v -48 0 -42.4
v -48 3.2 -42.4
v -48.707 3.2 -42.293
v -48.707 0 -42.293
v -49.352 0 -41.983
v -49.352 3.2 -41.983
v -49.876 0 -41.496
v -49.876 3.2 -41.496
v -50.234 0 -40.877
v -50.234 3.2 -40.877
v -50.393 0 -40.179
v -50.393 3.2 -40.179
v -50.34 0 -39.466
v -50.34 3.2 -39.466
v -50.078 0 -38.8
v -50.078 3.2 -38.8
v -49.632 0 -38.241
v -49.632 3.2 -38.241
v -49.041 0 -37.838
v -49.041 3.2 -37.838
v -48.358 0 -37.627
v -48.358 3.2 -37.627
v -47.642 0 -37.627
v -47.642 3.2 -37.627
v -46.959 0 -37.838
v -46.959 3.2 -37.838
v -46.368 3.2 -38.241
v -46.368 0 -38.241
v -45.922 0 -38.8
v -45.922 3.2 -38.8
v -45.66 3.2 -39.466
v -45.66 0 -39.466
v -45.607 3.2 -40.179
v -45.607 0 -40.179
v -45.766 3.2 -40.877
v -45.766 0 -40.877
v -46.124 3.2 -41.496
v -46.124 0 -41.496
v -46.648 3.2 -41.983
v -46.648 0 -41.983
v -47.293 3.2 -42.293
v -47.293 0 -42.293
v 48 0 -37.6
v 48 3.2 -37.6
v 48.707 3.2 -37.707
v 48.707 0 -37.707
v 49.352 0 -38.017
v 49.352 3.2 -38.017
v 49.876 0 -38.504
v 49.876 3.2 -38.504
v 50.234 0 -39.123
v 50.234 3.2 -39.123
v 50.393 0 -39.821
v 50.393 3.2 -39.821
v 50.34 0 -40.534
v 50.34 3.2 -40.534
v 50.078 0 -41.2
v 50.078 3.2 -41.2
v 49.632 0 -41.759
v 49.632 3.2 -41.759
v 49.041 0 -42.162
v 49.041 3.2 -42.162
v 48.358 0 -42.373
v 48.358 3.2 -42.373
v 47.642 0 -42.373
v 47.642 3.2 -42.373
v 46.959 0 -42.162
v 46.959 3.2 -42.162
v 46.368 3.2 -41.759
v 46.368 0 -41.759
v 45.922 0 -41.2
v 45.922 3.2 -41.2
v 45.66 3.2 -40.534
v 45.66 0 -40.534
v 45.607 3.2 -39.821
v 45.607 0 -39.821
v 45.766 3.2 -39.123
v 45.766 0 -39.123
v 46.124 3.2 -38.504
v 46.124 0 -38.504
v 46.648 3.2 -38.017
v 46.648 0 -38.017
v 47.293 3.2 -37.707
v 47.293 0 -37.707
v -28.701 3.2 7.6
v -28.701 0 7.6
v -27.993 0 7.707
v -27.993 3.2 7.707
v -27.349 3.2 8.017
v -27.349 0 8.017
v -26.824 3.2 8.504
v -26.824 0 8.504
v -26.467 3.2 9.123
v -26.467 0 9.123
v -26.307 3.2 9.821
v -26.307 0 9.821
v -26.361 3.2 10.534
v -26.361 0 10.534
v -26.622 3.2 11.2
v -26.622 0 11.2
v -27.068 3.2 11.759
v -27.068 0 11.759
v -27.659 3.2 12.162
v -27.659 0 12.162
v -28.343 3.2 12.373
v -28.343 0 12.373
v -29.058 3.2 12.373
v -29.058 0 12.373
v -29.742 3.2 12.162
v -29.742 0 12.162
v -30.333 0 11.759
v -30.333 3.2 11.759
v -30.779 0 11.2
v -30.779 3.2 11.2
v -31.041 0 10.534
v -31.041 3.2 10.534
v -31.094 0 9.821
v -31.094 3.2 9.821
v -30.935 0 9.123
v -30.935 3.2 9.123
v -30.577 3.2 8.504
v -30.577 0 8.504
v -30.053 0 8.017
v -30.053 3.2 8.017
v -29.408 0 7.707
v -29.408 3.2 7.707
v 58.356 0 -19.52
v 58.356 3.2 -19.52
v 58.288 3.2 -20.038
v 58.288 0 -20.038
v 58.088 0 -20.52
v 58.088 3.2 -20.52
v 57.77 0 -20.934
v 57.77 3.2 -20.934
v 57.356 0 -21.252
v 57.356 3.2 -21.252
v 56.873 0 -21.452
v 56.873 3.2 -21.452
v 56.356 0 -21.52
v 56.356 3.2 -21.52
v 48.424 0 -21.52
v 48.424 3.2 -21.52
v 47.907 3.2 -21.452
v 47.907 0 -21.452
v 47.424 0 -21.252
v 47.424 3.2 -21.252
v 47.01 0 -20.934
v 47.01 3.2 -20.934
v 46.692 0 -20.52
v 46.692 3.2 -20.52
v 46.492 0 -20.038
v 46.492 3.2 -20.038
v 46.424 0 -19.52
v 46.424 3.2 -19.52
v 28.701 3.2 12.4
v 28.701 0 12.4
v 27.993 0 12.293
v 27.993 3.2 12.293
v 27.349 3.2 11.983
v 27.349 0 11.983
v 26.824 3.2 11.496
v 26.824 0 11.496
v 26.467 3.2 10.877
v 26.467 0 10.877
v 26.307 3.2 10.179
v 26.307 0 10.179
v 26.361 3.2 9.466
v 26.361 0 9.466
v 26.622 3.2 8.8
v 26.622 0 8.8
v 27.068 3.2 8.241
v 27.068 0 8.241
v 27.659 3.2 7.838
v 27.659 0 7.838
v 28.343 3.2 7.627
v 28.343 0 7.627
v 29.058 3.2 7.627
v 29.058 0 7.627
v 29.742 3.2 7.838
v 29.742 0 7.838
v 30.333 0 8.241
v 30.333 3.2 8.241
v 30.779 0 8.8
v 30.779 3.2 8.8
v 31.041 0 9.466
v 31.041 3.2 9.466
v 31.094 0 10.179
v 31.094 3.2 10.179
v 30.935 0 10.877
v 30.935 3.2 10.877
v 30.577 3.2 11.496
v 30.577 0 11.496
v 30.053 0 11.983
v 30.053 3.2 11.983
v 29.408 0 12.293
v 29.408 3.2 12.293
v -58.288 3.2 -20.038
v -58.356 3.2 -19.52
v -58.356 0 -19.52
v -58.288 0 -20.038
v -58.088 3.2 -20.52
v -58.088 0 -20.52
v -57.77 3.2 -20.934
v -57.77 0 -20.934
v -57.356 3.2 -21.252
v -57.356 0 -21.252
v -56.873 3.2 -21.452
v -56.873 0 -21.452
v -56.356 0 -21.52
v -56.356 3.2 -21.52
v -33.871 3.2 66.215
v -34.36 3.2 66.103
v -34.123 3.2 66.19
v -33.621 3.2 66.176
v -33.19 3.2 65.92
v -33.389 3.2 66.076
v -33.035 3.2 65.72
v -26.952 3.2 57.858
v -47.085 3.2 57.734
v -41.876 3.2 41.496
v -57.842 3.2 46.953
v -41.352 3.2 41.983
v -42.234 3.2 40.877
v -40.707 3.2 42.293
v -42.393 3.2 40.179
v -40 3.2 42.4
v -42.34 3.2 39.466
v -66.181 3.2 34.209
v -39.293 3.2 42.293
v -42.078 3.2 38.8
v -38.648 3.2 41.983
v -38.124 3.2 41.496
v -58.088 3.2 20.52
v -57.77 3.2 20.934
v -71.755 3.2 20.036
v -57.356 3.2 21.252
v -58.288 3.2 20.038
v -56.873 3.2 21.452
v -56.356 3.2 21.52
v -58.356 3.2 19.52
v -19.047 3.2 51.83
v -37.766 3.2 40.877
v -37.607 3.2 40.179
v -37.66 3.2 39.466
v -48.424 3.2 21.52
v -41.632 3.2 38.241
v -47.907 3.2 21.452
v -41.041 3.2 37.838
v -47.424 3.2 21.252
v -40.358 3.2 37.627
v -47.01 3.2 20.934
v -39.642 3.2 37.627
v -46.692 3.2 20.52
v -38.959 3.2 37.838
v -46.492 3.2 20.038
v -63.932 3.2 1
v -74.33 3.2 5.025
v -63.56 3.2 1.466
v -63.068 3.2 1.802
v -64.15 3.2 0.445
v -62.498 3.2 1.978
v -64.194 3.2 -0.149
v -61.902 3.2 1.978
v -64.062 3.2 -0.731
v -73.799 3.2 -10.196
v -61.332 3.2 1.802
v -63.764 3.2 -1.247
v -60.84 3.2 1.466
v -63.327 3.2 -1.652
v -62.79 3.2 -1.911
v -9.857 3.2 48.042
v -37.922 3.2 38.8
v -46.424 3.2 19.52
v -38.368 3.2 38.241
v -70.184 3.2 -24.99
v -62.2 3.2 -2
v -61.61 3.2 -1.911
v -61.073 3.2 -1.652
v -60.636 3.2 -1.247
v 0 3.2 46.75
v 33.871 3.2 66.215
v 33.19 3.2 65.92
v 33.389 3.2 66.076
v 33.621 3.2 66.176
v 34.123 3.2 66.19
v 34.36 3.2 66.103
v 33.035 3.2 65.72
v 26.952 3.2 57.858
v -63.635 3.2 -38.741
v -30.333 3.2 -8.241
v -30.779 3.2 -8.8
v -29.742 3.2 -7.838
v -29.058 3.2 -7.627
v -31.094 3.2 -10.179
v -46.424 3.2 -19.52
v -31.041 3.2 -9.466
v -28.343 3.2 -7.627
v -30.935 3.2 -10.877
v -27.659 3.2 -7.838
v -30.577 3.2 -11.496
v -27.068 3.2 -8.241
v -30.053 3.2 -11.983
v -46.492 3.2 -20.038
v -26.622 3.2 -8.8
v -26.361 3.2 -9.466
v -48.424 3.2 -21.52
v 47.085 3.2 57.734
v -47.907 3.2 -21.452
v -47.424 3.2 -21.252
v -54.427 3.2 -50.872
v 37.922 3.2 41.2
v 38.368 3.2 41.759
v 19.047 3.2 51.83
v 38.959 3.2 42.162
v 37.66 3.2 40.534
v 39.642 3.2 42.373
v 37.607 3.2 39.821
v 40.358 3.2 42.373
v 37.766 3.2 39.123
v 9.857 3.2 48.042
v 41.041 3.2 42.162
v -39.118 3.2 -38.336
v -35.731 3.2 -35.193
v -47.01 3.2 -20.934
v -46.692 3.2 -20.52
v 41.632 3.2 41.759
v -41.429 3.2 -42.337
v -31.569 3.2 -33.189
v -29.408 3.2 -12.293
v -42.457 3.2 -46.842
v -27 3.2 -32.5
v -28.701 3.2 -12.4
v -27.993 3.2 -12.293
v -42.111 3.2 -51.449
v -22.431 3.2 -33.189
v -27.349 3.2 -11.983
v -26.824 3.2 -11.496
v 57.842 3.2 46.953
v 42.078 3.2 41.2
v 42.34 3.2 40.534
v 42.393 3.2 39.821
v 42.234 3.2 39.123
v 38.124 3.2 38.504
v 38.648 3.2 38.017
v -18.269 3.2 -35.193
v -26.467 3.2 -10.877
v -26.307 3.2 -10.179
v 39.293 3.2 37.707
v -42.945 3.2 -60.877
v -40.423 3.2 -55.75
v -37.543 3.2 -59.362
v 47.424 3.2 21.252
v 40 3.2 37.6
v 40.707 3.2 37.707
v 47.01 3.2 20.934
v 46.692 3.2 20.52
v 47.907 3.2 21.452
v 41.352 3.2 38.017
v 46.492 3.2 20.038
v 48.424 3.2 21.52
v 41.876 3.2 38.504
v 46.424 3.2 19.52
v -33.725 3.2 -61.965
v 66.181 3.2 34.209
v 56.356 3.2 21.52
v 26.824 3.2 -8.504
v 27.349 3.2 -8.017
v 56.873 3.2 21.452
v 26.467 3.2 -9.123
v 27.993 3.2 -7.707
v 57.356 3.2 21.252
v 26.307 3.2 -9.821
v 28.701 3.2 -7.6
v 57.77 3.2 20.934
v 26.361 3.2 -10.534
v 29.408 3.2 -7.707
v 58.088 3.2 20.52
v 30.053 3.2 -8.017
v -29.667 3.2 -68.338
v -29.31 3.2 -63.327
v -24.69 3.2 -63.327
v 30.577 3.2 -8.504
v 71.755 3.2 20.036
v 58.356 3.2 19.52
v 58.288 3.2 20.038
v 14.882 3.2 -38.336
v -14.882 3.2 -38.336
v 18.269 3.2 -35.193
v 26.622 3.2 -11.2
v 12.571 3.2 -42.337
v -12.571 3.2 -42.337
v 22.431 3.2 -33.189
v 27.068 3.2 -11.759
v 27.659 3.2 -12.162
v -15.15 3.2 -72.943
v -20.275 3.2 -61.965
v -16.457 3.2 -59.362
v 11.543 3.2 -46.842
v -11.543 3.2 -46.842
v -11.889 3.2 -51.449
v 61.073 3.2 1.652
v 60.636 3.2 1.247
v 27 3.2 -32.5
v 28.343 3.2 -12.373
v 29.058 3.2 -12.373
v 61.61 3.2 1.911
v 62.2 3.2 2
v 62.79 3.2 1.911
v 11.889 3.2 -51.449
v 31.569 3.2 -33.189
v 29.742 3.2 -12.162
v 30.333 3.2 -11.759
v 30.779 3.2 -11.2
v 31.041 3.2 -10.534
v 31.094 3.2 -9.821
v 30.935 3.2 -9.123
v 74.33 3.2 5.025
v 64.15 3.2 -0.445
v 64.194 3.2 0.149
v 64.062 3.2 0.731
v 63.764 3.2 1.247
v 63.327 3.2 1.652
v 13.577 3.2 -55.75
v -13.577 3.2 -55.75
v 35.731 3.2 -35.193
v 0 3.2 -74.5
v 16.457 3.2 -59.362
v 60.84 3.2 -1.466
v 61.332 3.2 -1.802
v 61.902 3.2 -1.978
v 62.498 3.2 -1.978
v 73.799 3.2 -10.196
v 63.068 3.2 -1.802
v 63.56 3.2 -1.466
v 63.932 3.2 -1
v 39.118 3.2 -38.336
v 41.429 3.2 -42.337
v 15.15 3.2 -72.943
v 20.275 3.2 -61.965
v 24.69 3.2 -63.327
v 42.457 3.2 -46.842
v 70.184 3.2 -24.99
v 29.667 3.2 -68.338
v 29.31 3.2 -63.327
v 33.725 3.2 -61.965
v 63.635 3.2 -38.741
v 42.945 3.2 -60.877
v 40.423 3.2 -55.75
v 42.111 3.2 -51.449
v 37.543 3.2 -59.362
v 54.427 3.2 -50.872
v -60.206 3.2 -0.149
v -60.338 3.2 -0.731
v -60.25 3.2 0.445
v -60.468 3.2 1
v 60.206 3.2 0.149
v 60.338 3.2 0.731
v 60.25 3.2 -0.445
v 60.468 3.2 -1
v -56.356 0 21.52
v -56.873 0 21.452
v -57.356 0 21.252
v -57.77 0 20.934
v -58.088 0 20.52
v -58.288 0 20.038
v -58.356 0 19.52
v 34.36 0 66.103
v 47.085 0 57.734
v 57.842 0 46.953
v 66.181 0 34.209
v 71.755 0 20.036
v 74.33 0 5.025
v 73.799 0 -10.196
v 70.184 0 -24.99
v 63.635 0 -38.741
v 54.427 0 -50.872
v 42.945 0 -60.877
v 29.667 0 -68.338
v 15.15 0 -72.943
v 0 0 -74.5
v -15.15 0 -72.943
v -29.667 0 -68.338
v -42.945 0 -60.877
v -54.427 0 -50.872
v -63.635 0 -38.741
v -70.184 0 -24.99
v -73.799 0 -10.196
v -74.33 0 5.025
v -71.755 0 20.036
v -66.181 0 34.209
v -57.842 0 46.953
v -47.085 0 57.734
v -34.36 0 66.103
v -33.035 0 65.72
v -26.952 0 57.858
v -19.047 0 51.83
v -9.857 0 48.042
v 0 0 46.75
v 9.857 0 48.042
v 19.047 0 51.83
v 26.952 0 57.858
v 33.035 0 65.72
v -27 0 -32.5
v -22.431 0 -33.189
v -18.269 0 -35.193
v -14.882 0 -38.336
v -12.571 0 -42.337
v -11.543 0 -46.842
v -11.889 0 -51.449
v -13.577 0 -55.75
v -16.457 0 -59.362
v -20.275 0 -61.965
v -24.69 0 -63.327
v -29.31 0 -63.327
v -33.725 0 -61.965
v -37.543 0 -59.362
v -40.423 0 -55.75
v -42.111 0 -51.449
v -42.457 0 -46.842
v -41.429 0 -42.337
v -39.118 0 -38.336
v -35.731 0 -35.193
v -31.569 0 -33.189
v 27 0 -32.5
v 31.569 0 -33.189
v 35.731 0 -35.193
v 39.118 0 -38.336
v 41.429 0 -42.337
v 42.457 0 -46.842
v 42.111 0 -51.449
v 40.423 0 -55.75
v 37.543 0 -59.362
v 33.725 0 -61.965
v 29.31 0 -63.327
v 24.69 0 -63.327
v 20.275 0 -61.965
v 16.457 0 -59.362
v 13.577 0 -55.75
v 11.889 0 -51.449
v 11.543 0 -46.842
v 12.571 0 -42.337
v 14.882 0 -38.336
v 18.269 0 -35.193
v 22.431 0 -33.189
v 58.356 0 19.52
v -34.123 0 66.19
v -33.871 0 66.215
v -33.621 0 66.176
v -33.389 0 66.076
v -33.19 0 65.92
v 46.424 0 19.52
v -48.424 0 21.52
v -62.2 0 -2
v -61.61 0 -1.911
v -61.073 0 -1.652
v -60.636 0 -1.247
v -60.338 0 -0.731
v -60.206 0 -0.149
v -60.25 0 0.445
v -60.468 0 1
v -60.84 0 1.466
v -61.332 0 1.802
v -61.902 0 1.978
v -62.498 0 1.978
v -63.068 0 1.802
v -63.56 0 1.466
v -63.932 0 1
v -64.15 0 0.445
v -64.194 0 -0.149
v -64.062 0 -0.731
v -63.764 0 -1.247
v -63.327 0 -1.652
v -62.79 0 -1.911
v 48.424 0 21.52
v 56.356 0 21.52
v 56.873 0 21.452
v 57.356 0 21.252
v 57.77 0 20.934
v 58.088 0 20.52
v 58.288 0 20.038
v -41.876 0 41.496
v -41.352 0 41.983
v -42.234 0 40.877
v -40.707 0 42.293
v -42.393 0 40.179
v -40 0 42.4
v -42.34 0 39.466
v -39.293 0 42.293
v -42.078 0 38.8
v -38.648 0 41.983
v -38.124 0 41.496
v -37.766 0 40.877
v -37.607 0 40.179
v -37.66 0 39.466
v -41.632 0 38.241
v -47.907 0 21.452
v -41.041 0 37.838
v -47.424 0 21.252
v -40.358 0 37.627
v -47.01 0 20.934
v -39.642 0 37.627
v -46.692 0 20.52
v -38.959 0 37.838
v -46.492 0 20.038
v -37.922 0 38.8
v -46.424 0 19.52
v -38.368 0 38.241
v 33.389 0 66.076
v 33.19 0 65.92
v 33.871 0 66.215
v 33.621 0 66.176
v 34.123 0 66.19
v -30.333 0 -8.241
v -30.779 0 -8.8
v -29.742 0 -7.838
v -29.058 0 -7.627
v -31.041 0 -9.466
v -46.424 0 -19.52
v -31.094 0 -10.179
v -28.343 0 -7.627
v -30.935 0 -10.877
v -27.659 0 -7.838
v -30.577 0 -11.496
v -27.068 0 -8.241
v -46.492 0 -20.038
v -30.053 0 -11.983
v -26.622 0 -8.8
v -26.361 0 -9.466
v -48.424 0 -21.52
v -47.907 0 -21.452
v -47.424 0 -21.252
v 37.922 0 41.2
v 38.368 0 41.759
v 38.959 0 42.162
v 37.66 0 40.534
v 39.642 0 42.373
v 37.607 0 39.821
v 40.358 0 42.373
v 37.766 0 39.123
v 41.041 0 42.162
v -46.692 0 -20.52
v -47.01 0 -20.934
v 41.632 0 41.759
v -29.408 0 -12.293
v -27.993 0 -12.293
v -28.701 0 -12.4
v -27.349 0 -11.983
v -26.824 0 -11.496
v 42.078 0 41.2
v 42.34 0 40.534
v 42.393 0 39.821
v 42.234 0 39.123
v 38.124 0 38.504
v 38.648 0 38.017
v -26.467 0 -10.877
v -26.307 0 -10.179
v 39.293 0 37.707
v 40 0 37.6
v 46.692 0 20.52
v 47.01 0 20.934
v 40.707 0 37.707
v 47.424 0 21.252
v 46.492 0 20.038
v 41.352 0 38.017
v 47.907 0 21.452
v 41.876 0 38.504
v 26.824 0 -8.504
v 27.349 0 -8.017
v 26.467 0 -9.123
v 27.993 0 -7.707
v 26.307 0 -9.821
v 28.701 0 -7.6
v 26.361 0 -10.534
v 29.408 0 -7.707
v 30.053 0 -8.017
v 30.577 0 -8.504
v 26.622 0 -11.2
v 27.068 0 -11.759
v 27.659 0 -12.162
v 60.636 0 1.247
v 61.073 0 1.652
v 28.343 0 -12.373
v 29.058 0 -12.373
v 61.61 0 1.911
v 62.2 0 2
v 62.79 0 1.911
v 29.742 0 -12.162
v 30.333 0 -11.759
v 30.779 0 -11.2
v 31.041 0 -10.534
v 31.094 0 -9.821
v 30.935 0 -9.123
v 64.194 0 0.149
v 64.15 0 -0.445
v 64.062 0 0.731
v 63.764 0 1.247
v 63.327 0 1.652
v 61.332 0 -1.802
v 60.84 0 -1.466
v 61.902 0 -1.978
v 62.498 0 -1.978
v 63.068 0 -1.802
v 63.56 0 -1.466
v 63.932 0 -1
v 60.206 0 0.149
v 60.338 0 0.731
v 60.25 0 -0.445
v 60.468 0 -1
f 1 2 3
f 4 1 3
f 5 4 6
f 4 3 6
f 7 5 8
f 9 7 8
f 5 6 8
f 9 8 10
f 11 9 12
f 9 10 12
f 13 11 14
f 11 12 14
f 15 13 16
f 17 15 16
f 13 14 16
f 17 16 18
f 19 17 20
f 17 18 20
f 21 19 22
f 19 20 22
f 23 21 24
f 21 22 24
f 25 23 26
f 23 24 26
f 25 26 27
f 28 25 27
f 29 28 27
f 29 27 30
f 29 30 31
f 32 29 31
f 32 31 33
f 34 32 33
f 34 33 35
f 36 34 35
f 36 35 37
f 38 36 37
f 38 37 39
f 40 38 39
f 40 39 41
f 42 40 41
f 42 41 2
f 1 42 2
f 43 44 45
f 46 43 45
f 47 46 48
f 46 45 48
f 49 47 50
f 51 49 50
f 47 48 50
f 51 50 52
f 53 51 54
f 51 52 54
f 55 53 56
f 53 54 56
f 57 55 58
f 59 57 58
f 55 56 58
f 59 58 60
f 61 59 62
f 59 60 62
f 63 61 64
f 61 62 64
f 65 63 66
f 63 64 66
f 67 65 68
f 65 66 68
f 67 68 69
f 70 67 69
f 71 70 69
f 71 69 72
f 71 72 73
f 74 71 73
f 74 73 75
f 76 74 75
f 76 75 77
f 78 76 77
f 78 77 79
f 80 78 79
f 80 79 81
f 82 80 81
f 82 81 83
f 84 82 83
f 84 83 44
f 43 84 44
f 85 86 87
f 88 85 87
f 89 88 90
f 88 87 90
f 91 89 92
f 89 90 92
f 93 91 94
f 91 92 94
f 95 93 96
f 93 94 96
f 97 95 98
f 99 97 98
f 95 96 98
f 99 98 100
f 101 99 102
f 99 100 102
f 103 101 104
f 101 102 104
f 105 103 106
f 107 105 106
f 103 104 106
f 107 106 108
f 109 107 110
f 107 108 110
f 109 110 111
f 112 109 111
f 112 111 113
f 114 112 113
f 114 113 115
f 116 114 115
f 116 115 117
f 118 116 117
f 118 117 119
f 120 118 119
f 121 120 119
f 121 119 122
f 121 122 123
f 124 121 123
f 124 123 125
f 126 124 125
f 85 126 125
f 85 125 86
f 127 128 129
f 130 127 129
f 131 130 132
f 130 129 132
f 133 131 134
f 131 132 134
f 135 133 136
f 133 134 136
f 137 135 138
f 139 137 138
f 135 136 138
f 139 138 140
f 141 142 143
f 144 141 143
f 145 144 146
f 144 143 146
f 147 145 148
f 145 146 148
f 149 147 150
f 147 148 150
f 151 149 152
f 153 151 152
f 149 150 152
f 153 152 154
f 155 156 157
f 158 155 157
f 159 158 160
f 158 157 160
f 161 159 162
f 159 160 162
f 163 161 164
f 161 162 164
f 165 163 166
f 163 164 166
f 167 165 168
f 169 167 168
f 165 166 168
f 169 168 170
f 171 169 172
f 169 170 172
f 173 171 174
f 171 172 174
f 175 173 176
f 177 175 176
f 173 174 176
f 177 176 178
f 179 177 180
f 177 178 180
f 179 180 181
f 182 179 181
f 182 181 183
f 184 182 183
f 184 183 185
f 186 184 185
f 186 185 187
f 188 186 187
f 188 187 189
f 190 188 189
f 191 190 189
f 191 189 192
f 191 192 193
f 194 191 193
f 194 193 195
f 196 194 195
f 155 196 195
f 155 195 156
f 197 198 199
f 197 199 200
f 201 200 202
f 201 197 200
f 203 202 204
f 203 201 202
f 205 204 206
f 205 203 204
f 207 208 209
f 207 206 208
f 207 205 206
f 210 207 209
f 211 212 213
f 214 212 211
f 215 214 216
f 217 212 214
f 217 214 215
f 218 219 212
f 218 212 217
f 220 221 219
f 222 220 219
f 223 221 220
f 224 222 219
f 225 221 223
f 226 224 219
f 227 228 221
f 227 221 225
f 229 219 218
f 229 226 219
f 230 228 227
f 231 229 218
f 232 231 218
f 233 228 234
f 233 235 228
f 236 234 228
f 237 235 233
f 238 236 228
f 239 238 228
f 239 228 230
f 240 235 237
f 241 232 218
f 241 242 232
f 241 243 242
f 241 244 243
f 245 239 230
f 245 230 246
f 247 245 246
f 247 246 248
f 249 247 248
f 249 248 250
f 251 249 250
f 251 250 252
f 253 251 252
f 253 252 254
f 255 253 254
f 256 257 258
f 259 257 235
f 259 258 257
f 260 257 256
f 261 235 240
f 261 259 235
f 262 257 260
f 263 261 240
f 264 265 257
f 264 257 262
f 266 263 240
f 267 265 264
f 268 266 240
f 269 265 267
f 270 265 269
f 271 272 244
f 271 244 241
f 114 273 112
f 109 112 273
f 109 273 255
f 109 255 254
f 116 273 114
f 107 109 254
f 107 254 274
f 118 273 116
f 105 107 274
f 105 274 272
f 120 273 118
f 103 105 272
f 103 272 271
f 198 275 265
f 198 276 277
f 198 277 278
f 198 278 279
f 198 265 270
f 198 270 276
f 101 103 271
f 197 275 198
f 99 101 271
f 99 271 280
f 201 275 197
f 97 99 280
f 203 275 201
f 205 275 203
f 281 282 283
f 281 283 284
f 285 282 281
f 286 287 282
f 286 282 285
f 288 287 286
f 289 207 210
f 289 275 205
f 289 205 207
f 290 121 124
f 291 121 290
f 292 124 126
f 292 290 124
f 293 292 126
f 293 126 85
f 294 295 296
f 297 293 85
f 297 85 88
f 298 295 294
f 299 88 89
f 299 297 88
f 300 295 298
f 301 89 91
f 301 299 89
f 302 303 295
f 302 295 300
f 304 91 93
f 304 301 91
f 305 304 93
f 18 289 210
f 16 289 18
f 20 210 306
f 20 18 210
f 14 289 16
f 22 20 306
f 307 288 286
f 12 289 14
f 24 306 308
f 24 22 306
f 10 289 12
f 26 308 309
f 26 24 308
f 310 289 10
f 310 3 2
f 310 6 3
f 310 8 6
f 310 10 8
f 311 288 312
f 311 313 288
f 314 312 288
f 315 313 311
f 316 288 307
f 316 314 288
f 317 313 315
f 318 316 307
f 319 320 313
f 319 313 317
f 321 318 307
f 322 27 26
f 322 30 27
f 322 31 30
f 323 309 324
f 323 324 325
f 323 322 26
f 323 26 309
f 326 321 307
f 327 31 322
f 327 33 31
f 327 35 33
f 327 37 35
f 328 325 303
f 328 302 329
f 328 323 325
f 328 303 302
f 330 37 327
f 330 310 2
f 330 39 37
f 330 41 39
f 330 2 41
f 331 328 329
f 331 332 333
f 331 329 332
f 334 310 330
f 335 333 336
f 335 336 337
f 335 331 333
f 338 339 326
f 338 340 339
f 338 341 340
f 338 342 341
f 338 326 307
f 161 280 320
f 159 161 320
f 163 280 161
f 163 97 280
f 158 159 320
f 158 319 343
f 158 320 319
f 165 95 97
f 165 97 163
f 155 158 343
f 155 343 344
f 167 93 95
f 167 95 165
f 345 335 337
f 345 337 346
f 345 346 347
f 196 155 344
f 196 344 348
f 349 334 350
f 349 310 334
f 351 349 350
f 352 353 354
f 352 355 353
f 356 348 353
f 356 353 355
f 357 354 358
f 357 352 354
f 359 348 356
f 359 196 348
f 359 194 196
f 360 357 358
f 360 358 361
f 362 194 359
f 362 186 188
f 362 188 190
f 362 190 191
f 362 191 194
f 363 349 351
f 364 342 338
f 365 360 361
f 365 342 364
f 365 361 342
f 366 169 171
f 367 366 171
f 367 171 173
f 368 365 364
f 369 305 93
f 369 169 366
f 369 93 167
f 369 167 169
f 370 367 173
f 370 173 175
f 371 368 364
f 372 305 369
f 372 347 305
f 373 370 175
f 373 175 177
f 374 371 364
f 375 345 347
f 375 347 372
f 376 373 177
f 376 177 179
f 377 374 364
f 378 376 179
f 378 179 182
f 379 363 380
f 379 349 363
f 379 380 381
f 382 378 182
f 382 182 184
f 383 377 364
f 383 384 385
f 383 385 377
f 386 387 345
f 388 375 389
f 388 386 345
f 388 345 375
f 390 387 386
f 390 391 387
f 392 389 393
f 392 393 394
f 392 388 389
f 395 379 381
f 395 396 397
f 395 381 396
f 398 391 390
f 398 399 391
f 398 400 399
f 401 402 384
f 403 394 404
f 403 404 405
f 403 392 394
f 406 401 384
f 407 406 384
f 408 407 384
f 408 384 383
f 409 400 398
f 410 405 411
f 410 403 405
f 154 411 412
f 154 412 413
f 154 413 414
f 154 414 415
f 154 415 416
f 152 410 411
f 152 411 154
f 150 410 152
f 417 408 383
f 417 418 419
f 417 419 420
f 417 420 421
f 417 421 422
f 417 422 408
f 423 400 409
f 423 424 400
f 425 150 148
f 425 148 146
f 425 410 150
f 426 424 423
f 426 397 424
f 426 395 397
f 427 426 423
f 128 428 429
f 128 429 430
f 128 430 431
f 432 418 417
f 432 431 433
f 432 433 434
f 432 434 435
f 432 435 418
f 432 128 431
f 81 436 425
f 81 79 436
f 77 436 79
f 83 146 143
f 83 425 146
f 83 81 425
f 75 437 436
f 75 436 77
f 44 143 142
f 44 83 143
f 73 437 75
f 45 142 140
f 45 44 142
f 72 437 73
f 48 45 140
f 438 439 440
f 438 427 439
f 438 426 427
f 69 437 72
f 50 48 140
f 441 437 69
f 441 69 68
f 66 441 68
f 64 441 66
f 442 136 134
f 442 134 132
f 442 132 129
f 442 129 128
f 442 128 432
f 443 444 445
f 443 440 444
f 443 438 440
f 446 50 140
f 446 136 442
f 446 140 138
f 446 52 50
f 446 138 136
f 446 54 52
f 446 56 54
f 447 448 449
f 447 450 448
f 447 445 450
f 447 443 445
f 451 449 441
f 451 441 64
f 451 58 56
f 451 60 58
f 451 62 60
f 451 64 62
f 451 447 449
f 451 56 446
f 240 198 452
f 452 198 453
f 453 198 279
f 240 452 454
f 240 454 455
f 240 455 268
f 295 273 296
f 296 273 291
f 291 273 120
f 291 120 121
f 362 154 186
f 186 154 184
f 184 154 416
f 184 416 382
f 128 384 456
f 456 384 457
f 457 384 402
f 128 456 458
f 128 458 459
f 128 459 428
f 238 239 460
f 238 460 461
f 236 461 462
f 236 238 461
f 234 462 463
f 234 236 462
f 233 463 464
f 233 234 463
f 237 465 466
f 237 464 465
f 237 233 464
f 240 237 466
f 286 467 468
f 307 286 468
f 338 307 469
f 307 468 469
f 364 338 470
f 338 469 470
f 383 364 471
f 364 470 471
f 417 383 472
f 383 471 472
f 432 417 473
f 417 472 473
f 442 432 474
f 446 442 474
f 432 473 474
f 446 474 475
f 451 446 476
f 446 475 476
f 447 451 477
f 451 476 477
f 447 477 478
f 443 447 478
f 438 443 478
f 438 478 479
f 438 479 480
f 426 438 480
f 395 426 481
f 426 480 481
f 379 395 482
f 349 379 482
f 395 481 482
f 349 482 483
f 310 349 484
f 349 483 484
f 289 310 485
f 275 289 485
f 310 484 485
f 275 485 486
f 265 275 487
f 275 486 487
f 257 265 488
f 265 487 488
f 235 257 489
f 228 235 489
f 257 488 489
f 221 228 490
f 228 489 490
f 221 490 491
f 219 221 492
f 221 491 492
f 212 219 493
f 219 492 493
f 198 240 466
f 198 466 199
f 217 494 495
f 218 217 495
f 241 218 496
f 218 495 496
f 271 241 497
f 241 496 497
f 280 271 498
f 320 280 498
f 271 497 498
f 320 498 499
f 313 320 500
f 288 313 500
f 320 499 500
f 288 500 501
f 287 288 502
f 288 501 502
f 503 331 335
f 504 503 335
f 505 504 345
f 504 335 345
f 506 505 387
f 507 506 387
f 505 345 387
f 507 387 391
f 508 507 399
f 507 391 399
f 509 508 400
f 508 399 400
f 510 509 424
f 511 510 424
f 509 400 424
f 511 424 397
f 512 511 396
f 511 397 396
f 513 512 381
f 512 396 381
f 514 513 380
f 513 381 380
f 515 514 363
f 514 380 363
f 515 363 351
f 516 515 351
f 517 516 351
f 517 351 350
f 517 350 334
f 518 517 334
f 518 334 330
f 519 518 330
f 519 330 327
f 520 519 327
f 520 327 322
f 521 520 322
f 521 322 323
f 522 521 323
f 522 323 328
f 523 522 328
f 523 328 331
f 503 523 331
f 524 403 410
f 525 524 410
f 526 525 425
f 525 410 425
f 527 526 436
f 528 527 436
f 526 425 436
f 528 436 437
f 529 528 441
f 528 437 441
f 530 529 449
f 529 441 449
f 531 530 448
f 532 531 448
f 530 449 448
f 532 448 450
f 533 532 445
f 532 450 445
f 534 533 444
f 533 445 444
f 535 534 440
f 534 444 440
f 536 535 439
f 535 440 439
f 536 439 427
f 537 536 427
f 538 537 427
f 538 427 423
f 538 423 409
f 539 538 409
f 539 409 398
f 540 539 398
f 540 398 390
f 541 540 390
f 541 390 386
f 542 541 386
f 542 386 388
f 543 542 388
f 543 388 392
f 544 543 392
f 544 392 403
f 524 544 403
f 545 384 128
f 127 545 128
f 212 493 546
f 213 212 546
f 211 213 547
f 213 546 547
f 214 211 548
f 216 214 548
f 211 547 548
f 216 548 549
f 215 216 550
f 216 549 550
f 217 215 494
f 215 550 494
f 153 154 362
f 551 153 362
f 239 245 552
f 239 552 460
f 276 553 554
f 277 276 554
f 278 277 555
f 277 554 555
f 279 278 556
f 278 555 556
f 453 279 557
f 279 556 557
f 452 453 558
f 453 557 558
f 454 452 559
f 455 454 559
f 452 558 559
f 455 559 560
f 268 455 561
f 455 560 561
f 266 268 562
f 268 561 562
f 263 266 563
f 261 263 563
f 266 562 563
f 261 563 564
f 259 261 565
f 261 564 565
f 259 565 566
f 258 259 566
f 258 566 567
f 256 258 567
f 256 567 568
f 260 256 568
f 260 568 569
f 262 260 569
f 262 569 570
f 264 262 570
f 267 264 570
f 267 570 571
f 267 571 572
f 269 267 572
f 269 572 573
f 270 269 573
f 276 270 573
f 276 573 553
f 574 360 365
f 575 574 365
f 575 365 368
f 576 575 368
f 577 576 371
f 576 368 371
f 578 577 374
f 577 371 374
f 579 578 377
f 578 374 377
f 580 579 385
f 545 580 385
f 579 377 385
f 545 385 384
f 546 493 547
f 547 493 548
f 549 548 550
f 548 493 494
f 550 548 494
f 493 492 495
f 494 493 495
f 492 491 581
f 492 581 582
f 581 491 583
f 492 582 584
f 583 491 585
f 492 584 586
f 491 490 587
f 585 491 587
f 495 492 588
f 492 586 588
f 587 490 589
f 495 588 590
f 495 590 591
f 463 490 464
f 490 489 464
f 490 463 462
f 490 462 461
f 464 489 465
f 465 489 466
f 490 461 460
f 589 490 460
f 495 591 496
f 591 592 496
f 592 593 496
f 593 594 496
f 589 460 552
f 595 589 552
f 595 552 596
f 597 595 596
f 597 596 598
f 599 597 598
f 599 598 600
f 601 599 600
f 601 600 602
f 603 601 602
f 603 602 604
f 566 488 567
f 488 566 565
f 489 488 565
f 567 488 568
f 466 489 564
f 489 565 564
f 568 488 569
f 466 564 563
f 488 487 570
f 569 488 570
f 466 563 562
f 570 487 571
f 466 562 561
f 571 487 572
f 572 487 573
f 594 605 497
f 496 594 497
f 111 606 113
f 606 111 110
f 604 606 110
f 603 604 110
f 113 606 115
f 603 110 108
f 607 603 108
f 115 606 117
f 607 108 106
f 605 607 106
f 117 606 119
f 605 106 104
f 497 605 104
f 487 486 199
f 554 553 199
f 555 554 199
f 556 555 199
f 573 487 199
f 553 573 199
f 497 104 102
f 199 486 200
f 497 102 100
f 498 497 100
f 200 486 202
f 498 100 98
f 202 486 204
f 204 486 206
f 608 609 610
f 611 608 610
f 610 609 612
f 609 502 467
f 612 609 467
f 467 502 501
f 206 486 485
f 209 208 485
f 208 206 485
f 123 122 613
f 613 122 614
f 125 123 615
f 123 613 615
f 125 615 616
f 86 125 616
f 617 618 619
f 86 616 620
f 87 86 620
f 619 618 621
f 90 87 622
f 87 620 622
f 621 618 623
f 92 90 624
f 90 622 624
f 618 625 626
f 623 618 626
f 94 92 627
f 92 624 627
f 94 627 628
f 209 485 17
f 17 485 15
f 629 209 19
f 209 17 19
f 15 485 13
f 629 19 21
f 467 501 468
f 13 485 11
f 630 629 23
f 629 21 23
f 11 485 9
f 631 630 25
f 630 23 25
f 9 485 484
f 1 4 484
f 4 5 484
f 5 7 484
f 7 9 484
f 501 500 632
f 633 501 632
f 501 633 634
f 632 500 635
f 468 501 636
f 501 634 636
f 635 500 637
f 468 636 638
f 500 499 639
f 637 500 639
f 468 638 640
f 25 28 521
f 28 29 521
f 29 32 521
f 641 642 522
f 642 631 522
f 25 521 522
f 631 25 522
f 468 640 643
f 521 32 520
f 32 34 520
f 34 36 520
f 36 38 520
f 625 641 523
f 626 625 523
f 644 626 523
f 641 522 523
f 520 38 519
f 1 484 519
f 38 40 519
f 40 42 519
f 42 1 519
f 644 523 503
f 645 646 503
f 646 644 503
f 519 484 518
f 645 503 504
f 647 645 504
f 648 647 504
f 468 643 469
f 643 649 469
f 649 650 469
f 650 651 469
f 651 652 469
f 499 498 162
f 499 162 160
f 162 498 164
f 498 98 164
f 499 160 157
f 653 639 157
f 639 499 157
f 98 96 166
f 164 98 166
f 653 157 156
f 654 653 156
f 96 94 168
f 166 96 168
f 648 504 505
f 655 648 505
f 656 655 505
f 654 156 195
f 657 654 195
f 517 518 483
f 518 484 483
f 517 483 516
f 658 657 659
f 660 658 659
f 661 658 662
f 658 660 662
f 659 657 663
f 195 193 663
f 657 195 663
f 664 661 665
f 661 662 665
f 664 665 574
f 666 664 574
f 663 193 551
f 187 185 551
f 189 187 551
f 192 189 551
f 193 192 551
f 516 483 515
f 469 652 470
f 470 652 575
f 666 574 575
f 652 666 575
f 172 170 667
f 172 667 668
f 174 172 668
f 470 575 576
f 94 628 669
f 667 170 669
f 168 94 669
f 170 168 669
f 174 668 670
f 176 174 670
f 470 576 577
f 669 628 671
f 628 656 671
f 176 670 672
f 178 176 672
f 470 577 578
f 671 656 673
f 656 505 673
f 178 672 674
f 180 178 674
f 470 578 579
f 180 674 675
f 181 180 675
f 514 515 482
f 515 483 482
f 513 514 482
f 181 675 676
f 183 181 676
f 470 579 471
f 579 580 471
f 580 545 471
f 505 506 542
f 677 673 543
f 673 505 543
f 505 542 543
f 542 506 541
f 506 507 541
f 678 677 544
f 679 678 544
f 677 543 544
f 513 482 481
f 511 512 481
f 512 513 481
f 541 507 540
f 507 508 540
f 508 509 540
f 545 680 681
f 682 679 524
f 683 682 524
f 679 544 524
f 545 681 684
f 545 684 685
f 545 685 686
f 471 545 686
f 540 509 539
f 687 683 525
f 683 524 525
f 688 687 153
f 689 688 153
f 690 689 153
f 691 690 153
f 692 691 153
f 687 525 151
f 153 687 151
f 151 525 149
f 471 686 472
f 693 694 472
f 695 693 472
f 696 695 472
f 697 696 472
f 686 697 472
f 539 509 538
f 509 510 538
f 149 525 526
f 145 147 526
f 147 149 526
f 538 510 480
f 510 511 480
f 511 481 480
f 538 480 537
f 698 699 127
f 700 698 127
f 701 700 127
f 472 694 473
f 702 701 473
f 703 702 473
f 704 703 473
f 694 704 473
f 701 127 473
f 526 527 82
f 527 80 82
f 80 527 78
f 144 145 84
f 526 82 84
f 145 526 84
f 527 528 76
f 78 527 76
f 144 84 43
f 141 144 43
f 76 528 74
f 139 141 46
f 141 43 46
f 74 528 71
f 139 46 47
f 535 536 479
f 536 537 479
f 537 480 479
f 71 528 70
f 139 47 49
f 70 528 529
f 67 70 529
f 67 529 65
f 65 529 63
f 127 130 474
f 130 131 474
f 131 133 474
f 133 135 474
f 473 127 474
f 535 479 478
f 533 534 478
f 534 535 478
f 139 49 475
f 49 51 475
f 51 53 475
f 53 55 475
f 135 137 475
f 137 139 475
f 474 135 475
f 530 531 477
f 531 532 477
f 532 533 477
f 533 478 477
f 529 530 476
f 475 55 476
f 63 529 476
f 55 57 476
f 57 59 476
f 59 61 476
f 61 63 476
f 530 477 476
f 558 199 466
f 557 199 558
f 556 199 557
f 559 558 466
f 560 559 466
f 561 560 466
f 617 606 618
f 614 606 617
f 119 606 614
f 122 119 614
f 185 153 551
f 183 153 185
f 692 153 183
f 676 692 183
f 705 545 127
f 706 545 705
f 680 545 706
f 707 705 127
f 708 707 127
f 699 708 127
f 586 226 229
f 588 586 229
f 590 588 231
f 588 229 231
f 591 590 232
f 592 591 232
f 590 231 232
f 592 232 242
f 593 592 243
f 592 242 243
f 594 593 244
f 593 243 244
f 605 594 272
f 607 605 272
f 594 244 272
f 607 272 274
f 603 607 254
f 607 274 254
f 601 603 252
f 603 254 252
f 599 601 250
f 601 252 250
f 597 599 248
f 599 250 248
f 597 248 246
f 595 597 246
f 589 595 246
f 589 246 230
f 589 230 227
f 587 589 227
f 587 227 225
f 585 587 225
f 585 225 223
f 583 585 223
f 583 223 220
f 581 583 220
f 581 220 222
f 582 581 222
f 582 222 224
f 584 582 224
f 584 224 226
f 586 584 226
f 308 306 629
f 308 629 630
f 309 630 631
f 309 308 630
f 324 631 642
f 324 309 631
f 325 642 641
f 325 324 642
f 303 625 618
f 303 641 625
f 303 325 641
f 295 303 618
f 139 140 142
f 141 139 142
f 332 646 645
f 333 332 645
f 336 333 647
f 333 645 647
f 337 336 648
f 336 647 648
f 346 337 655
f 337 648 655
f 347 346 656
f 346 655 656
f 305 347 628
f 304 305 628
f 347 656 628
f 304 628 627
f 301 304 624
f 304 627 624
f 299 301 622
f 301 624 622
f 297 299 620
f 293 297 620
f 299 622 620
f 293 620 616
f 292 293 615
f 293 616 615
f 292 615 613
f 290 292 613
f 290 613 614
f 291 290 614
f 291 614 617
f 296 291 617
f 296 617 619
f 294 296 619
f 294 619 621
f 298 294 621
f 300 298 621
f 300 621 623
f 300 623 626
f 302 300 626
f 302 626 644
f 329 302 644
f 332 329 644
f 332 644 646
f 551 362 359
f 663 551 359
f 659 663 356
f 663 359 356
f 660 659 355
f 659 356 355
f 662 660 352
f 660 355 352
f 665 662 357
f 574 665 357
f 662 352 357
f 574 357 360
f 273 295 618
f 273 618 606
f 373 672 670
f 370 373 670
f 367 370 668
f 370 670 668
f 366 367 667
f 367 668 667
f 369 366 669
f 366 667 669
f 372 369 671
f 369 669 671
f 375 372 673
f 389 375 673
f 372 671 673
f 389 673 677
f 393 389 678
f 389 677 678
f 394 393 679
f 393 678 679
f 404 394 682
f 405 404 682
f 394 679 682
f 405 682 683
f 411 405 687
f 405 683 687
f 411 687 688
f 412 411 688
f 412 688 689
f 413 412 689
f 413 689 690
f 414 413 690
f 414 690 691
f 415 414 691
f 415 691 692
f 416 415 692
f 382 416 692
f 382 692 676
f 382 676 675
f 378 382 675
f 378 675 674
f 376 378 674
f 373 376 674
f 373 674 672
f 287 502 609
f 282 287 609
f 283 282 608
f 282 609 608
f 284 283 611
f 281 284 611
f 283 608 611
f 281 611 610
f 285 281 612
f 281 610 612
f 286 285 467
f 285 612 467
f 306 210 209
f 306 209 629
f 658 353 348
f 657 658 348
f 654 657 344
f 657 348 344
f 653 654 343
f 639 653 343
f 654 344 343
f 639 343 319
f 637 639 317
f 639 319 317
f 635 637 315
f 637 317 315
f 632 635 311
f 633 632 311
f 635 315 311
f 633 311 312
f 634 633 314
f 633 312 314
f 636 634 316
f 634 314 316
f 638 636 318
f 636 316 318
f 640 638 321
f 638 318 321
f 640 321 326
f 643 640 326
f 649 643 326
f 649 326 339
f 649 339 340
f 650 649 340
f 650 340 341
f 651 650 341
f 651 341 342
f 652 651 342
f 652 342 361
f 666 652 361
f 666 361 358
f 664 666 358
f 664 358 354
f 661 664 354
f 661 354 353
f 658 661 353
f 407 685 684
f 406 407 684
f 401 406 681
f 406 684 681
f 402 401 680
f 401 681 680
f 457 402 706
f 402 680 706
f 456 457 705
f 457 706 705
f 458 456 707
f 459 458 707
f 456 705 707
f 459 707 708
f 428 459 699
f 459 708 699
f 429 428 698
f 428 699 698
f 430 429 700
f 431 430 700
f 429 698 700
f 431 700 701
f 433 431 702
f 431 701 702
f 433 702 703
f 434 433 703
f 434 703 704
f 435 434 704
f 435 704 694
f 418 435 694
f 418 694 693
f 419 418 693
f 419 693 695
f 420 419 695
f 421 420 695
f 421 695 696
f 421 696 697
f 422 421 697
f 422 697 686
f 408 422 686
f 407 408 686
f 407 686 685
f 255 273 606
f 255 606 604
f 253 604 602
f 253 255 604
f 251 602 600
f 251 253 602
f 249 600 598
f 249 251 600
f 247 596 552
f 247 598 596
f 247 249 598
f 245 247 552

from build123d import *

# Parameters (mm, degrees)
BOSS_EXTRUDE1_DEPTH = 3.2
SKETCH2_W           = 10.76
SKETCH2_H           = 41.868700306
CUT_EXTRUDE1_DEPTH  = 106.40749499
SKETCH3_R           = 2
SKETCH3_R_2         = 2.4
CUT_EXTRUDE2_DEPTH  = 106.40749499
SKETCH4_R           = 15
CUT_EXTRUDE3_DEPTH  = 106.40749499
CUT_EXTRUDE4_DEPTH  = 106.40749499
SKETCH6_R           = 2.4
CUT_EXTRUDE5_DEPTH  = 106.40749499
SKETCH8_R           = 15.5
CUT_EXTRUDE6_DEPTH  = 106.40749499


with BuildPart() as part:
    # Sketch1 → Boss-Extrude1 (new body)
    with BuildSketch(Plane(origin=(0, 0, 0), x_dir=(1, 0, 0), z_dir=(0, 1, 0))):
        with BuildLine():
            ThreePointArc((34.36030176, -66.103098739), (0, 74.5), (-34.36030176, -66.103098739))
            ThreePointArc((-34.36030176, -66.103098739), (-33.621222066, -66.176428208), (-33.035418582, -65.71986465))
            ThreePointArc((-33.035418582, -65.71986465), (0, -46.75), (33.035418582, -65.71986465))
            ThreePointArc((33.035418582, -65.71986465), (33.621222066, -66.176428208), (34.36030176, -66.103098739))
        make_face()
    extrude(amount=BOSS_EXTRUDE1_DEPTH)

    # Sketch2 → Cut-Extrude1 (cut, through all)
    with BuildSketch(Plane(origin=(0, 3.2, 0), x_dir=(1, 0, 0), z_dir=(0, 1, 0))):
        with Locations((-52.39, 0)):
            Rectangle(SKETCH2_W, SKETCH2_H)
        with Locations((52.39, 0)):
            Rectangle(SKETCH2_W, SKETCH2_H)
    extrude(amount=-CUT_EXTRUDE1_DEPTH, mode=Mode.SUBTRACT)

    # Sketch3 → Cut-Extrude2 (cut, through all)
    with BuildSketch(Plane.XZ):
        with Locations(Location((-62.2, 0, 0), (0, 0, 270))):
            Circle(SKETCH3_R)
        with Locations(Location((-28.700738686, 10, 0), (0, 0, 270))):
            Circle(SKETCH3_R_2)
        with Locations(Location((-28.700738686, -10, 0), (0, 0, 270))):
            Circle(SKETCH3_R_2)
        with Locations(Location((28.700738686, -10, 0), (0, 0, 90))):
            Circle(SKETCH3_R_2)
        with Locations(Location((28.700738686, 10, 0), (0, 0, 90))):
            Circle(SKETCH3_R_2)
        with Locations(Location((62.2, 0, 0), (0, 0, 90))):
            Circle(SKETCH3_R)
    extrude(amount=-CUT_EXTRUDE2_DEPTH, mode=Mode.SUBTRACT)

    # Sketch4 → Cut-Extrude3 (cut, through all)
    with BuildSketch(Plane(origin=(0, 3.2, 0), x_dir=(1, 0, 0), z_dir=(0, 1, 0))):
        with Locations(Location((-27, 48, 0), (0, 0, 270))):
            Circle(SKETCH4_R)
        with Locations(Location((27, 48, 0), (0, 0, 90))):
            Circle(SKETCH4_R)
    extrude(amount=-CUT_EXTRUDE3_DEPTH, mode=Mode.SUBTRACT)

    # Sketch5 → Cut-Extrude4 (cut, through all)
    with BuildSketch(Plane(origin=(0, 3.2, 0), x_dir=(1, 0, 0), z_dir=(0, 1, 0))):
        with BuildLine():
            Line((-56.355786438, 21.520136591), (-48.424213562, 21.520136591))
            ThreePointArc((-48.424213562, 21.520136591), (-47.01, 20.934350153), (-46.424213562, 19.520136591))
            Line((-46.424213562, 19.520136591), (-46.424213562, -19.520136591))
            ThreePointArc((-46.424213562, -19.520136591), (-47.01, -20.934350153), (-48.424213562, -21.520136591))
            Line((-48.424213562, -21.520136591), (-56.355786438, -21.520136591))
            ThreePointArc((-56.355786438, -21.520136591), (-57.77, -20.934350153), (-58.355786438, -19.520136591))
            Line((-58.355786438, -19.520136591), (-58.355786438, 19.520136591))
            ThreePointArc((-58.355786438, 19.520136591), (-57.77, 20.934350153), (-56.355786438, 21.520136591))
        make_face()
        with BuildLine():
            Line((46.424213562, 19.520136591), (46.424213562, -19.520136591))
            ThreePointArc((46.424213562, -19.520136591), (47.01, -20.934350153), (48.424213562, -21.520136591))
            Line((48.424213562, -21.520136591), (56.355786438, -21.520136591))
            ThreePointArc((56.355786438, -21.520136591), (57.77, -20.934350153), (58.355786438, -19.520136591))
            Line((58.355786438, -19.520136591), (58.355786438, 19.520136591))
            ThreePointArc((58.355786438, 19.520136591), (57.77, 20.934350153), (56.355786438, 21.520136591))
            Line((56.355786438, 21.520136591), (48.424213562, 21.520136591))
            ThreePointArc((48.424213562, 21.520136591), (47.01, 20.934350153), (46.424213562, 19.520136591))
        make_face()
    extrude(amount=-CUT_EXTRUDE4_DEPTH, mode=Mode.SUBTRACT)

    # Sketch6 → Cut-Extrude5 (cut, through all)
    with BuildSketch(Plane(origin=(0, 3.2, 0), x_dir=(1, 0, 0), z_dir=(0, 1, 0))):
        with Locations(Location((48, 40, 0), (0, 0, 270))):
            Circle(SKETCH6_R)
        with Locations(Location((-40, -40, 0), (0, 0, 270))):
            Circle(SKETCH6_R)
        with Locations(Location((40, -40, 0), (0, 0, 90))):
            Circle(SKETCH6_R)
        with Locations(Location((-48, 40, 0), (0, 0, 90))):
            Circle(SKETCH6_R)
    extrude(amount=-CUT_EXTRUDE5_DEPTH, mode=Mode.SUBTRACT)

    # Sketch8 → Cut-Extrude6 (cut, through all)
    with BuildSketch(Plane(origin=(0, 3.2, 0), x_dir=(1, 0, 0), z_dir=(0, 1, 0))):
        with Locations(Location((-27, 48, 0), (0, 0, 270))):
            Circle(SKETCH8_R)
        with Locations(Location((27, 48, 0), (0, 0, 270))):
            Circle(SKETCH8_R)
    extrude(amount=-CUT_EXTRUDE6_DEPTH, mode=Mode.SUBTRACT)


solid = part.part
